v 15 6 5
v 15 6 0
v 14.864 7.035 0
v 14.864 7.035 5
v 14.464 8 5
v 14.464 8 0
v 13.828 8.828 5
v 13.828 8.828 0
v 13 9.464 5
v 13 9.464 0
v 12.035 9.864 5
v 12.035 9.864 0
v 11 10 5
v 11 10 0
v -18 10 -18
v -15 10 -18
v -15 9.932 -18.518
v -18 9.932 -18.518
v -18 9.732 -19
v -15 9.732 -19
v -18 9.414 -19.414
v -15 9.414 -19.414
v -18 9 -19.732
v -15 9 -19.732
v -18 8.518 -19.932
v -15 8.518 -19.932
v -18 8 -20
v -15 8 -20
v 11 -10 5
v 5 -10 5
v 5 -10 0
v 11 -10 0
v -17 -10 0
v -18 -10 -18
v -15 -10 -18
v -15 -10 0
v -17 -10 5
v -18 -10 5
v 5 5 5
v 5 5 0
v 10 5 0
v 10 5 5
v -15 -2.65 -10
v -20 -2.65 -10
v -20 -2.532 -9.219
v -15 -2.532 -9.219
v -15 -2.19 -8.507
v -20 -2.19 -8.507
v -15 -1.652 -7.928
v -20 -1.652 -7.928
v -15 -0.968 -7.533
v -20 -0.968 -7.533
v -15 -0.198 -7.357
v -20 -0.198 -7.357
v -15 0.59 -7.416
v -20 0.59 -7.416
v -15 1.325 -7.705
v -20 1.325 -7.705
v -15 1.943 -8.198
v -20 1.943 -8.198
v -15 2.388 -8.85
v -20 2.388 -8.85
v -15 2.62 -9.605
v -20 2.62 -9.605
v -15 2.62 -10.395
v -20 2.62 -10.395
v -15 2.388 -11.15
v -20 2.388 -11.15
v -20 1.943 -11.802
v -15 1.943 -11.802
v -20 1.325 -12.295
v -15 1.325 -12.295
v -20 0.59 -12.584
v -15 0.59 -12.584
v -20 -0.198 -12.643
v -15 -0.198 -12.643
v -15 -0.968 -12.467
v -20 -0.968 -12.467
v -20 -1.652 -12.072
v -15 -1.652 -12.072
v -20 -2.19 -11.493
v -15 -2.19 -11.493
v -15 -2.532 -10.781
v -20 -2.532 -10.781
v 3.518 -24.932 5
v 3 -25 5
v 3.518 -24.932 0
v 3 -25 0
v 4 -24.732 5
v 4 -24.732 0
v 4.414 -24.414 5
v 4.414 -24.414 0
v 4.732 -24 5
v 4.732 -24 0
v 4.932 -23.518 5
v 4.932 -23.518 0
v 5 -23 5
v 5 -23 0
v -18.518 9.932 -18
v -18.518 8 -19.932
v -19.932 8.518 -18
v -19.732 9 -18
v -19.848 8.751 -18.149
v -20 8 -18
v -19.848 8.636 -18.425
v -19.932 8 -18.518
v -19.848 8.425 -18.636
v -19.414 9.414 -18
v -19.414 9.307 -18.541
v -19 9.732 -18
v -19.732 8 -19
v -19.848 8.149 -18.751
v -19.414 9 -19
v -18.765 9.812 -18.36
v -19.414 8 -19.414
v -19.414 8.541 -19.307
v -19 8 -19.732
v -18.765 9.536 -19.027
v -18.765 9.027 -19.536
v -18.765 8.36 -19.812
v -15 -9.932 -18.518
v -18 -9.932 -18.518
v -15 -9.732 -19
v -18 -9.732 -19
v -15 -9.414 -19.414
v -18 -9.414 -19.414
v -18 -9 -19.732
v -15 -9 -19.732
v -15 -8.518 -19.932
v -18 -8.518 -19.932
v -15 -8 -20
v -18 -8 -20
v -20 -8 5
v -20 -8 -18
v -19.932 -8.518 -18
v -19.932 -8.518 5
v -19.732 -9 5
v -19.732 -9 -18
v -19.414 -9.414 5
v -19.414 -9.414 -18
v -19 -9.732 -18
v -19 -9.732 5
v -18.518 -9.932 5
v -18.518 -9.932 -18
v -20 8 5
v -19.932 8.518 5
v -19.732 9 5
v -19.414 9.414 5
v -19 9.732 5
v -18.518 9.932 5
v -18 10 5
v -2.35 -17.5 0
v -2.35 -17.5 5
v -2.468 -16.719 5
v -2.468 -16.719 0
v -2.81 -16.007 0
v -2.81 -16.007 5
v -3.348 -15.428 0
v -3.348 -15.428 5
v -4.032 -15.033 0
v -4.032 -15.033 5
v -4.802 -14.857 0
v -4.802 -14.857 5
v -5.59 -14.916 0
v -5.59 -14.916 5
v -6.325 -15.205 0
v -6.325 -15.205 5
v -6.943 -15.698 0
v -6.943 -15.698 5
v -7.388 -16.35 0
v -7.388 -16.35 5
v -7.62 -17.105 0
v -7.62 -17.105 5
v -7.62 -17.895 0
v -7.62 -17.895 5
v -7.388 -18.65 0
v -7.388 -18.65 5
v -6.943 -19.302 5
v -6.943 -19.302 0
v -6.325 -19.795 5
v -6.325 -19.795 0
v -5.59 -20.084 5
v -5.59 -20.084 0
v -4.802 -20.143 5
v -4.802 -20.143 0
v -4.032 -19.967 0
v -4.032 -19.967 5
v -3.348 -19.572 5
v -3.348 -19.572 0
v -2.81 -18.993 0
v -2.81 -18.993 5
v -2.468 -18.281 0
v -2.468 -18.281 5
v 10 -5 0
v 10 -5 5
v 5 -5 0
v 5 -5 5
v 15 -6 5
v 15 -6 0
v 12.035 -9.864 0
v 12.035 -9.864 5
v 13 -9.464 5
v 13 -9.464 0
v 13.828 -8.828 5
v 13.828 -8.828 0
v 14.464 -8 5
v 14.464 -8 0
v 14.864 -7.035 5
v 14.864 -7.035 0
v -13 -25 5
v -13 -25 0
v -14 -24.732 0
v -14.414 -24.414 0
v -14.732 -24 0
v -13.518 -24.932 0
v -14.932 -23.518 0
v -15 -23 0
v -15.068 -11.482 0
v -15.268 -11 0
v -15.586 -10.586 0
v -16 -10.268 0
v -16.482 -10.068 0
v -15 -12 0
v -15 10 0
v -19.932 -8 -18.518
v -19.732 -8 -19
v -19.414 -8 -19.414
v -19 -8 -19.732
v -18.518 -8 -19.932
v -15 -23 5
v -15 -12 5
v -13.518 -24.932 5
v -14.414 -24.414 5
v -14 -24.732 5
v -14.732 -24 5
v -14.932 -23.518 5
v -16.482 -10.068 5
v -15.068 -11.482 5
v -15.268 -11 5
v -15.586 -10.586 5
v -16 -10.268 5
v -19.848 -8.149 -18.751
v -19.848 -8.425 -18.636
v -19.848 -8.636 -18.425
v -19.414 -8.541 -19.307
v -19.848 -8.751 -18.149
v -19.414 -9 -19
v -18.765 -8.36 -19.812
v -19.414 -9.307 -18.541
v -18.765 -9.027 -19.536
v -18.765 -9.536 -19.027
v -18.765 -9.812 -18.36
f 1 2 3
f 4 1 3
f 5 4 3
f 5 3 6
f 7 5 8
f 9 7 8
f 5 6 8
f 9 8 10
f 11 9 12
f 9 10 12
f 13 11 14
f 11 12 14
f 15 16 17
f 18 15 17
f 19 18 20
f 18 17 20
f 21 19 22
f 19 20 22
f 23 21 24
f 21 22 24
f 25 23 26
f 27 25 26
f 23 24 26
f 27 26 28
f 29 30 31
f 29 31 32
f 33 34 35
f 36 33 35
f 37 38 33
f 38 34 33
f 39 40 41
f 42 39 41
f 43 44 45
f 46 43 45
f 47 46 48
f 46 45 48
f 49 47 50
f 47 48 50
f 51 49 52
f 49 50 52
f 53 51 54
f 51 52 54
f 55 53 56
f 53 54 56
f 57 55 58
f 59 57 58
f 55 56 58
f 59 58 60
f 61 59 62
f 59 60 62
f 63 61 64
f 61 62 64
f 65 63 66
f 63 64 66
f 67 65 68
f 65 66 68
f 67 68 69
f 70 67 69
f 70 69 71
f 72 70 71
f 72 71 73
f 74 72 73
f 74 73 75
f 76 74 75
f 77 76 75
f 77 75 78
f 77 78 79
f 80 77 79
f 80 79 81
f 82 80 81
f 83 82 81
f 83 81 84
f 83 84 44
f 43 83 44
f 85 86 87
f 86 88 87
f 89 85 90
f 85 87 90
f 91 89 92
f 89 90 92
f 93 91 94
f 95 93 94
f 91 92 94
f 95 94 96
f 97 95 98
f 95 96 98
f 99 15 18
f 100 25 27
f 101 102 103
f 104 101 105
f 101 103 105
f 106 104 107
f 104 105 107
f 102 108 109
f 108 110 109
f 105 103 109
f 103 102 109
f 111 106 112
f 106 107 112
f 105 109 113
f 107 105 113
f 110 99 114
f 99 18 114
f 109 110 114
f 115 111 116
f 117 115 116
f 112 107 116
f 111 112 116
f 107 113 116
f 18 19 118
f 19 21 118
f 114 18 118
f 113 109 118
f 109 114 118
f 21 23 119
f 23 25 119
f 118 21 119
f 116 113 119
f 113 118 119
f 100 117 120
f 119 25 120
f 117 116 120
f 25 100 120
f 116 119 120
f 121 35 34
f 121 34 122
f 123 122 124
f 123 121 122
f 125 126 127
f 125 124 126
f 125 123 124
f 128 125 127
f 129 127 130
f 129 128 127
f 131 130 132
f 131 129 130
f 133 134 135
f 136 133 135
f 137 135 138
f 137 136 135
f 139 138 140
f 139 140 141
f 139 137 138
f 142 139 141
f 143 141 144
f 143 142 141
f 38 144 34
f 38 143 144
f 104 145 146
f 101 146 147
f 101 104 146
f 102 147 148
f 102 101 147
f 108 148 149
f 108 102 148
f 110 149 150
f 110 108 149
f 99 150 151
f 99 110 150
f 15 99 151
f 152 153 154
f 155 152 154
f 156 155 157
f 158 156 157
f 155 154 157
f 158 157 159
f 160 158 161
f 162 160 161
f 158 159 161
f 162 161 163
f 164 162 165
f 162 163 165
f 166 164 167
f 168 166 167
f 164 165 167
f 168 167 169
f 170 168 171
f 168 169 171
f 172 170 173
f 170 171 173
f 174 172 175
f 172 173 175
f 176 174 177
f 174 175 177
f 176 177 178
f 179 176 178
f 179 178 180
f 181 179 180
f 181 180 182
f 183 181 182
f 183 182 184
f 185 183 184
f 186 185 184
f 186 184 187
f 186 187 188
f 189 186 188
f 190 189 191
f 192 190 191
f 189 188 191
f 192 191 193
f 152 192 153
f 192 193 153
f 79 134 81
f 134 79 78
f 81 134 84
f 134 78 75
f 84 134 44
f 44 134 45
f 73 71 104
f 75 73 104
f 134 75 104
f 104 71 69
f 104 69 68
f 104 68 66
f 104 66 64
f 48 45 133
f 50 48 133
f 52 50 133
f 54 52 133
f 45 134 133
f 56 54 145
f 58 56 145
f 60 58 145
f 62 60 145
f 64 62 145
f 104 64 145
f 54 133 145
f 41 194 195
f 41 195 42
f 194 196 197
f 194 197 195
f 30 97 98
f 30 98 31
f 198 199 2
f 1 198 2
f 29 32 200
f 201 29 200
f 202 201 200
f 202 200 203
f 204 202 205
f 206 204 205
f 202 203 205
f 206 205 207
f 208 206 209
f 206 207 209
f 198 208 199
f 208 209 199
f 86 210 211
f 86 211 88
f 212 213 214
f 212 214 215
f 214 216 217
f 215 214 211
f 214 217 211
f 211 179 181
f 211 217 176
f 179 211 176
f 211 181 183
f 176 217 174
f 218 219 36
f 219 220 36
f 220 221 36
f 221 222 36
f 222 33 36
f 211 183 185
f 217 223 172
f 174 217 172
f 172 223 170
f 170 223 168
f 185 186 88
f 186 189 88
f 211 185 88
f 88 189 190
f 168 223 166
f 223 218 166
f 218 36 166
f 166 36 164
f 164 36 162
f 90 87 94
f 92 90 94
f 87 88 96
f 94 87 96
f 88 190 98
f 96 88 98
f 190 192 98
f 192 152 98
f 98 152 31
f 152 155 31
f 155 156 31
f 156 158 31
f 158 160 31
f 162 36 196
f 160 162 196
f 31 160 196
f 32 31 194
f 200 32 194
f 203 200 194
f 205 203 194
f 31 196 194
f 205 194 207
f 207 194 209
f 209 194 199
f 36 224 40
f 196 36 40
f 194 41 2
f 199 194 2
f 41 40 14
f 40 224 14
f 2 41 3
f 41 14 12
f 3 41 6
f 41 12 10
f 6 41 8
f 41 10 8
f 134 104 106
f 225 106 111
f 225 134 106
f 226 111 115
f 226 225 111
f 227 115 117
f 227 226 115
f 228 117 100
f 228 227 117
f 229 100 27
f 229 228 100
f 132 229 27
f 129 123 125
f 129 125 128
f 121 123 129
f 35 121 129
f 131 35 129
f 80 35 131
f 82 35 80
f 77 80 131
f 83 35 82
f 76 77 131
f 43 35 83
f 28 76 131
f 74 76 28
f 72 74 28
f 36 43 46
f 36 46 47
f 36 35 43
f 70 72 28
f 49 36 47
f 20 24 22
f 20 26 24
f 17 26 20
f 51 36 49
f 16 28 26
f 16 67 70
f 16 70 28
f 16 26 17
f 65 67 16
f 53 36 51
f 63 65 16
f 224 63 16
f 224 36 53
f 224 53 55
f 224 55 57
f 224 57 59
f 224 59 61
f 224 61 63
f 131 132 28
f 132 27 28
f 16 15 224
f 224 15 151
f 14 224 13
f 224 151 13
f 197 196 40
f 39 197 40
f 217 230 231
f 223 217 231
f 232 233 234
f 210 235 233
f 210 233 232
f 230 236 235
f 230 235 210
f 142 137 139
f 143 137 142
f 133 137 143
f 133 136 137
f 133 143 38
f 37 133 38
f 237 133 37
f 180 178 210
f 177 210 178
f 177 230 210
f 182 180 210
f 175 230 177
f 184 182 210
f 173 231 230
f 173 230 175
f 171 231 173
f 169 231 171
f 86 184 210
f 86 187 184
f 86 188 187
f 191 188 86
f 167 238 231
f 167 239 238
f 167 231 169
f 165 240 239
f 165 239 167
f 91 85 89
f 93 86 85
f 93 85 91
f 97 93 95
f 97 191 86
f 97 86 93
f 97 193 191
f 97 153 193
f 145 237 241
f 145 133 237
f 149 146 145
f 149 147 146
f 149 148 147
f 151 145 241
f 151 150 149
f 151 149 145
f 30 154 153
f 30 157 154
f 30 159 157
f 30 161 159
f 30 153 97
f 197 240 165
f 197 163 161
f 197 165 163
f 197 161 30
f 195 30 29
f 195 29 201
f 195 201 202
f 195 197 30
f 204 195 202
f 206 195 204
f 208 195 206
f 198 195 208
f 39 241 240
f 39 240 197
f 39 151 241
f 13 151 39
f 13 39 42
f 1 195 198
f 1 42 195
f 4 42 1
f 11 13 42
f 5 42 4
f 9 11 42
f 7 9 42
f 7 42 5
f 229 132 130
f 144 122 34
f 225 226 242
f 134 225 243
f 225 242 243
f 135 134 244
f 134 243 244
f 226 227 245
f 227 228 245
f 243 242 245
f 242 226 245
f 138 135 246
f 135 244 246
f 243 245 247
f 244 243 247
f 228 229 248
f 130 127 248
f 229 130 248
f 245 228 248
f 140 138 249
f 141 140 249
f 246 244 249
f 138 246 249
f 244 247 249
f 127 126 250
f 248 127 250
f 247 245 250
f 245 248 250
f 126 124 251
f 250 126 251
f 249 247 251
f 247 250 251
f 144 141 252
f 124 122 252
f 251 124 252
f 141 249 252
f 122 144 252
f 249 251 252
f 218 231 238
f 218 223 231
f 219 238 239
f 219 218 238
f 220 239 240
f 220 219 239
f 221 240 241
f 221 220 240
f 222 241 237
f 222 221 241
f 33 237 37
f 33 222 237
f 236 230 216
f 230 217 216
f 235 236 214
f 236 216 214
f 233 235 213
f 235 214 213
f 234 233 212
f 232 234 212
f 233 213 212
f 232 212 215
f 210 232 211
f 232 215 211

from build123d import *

# Parameters (mm, degrees)
CROQUIS1_W              = 5
CROQUIS1_H              = 10
SALIENTE_EXTRUIR1_DEPTH = 5
CROQUIS2_W              = 5
CROQUIS2_H              = 20
SALIENTE_EXTRUIR3_DEPTH = 25
CROQUIS3_R              = 2.65
CORTAR_EXTRUIR1_DEPTH   = 42.533119315
CROQUIS4_W              = 20
CROQUIS4_H              = 15
CROQUIS4_R              = 2.65
SALIENTE_EXTRUIR4_DEPTH = 5
REDONDEO1_R             = 2
REDONDEO2_R             = 2
REDONDEO3_R             = 2
REDONDEO4_R             = 2


with BuildPart() as part:
    # Croquis1 → Saliente-Extruir1 (new body)
    with BuildSketch(Plane.XY):
        with BuildLine():
            Line((-15, 10), (-15, -10))
            Line((-15, -10), (11, -10))
            ThreePointArc((11, -10), (13.828427125, -8.828427125), (15, -6))
            Line((15, -6), (15, 6))
            ThreePointArc((15, 6), (13.828427125, 8.828427125), (11, 10))
            Line((11, 10), (-15, 10))
        make_face()
        with Locations((7.5, 0)):
            Rectangle(CROQUIS1_W, CROQUIS1_H, mode=Mode.SUBTRACT)
    extrude(amount=SALIENTE_EXTRUIR1_DEPTH)

    # Croquis2 → Saliente-Extruir3 (add)
    with BuildSketch(Plane.XY.offset(5)):
        with Locations((-17.5, 0)):
            Rectangle(CROQUIS2_W, CROQUIS2_H)
    extrude(amount=-SALIENTE_EXTRUIR3_DEPTH)

    # Croquis3 → Cortar-Extruir1 (cut, through all)
    with BuildSketch(Plane.ZY.offset(20)):
        with Locations((-10, 0)):
            Circle(CROQUIS3_R)
    extrude(amount=-CORTAR_EXTRUIR1_DEPTH, mode=Mode.SUBTRACT)

    # Croquis4 → Saliente-Extruir4 (add)
    with BuildSketch(Plane.XY.offset(5)):
        with Locations((-5, -17.5)):
            Rectangle(CROQUIS4_W, CROQUIS4_H)
        with Locations((-5, -17.5)):
            Circle(CROQUIS4_R, mode=Mode.SUBTRACT)
    extrude(amount=-SALIENTE_EXTRUIR4_DEPTH)

    # Redondeo1
    redondeo1_edges = [part.edges().sort_by_distance(p)[0] for p in [
        (-15, -10, 2.5),
    ]]
    fillet(redondeo1_edges, radius=REDONDEO1_R)

    # Redondeo2
    redondeo2_edges = [part.edges().sort_by_distance(p)[0] for p in [
        (5, -25, 2.5),
        (-15, -25, 2.5),
    ]]
    fillet(redondeo2_edges, radius=REDONDEO2_R)

    # Redondeo3
    redondeo3_edges = [part.edges().sort_by_distance(p)[0] for p in [
        (-17.5, 10, -20),
        (-17.5, -10, -20),
    ]]
    fillet(redondeo3_edges, radius=REDONDEO3_R)

    # Redondeo4
    redondeo4_edges = [part.edges().sort_by_distance(p)[0] for p in [
        (-20, -10, -6.5),
        (-20, -9.414213562, -19.414213562),
        (-20, 0, -20),
        (-20, 9.414213562, -19.414213562),
        (-20, 10, -6.5),
    ]]
    fillet(redondeo4_edges, radius=REDONDEO4_R)


solid = part.part
